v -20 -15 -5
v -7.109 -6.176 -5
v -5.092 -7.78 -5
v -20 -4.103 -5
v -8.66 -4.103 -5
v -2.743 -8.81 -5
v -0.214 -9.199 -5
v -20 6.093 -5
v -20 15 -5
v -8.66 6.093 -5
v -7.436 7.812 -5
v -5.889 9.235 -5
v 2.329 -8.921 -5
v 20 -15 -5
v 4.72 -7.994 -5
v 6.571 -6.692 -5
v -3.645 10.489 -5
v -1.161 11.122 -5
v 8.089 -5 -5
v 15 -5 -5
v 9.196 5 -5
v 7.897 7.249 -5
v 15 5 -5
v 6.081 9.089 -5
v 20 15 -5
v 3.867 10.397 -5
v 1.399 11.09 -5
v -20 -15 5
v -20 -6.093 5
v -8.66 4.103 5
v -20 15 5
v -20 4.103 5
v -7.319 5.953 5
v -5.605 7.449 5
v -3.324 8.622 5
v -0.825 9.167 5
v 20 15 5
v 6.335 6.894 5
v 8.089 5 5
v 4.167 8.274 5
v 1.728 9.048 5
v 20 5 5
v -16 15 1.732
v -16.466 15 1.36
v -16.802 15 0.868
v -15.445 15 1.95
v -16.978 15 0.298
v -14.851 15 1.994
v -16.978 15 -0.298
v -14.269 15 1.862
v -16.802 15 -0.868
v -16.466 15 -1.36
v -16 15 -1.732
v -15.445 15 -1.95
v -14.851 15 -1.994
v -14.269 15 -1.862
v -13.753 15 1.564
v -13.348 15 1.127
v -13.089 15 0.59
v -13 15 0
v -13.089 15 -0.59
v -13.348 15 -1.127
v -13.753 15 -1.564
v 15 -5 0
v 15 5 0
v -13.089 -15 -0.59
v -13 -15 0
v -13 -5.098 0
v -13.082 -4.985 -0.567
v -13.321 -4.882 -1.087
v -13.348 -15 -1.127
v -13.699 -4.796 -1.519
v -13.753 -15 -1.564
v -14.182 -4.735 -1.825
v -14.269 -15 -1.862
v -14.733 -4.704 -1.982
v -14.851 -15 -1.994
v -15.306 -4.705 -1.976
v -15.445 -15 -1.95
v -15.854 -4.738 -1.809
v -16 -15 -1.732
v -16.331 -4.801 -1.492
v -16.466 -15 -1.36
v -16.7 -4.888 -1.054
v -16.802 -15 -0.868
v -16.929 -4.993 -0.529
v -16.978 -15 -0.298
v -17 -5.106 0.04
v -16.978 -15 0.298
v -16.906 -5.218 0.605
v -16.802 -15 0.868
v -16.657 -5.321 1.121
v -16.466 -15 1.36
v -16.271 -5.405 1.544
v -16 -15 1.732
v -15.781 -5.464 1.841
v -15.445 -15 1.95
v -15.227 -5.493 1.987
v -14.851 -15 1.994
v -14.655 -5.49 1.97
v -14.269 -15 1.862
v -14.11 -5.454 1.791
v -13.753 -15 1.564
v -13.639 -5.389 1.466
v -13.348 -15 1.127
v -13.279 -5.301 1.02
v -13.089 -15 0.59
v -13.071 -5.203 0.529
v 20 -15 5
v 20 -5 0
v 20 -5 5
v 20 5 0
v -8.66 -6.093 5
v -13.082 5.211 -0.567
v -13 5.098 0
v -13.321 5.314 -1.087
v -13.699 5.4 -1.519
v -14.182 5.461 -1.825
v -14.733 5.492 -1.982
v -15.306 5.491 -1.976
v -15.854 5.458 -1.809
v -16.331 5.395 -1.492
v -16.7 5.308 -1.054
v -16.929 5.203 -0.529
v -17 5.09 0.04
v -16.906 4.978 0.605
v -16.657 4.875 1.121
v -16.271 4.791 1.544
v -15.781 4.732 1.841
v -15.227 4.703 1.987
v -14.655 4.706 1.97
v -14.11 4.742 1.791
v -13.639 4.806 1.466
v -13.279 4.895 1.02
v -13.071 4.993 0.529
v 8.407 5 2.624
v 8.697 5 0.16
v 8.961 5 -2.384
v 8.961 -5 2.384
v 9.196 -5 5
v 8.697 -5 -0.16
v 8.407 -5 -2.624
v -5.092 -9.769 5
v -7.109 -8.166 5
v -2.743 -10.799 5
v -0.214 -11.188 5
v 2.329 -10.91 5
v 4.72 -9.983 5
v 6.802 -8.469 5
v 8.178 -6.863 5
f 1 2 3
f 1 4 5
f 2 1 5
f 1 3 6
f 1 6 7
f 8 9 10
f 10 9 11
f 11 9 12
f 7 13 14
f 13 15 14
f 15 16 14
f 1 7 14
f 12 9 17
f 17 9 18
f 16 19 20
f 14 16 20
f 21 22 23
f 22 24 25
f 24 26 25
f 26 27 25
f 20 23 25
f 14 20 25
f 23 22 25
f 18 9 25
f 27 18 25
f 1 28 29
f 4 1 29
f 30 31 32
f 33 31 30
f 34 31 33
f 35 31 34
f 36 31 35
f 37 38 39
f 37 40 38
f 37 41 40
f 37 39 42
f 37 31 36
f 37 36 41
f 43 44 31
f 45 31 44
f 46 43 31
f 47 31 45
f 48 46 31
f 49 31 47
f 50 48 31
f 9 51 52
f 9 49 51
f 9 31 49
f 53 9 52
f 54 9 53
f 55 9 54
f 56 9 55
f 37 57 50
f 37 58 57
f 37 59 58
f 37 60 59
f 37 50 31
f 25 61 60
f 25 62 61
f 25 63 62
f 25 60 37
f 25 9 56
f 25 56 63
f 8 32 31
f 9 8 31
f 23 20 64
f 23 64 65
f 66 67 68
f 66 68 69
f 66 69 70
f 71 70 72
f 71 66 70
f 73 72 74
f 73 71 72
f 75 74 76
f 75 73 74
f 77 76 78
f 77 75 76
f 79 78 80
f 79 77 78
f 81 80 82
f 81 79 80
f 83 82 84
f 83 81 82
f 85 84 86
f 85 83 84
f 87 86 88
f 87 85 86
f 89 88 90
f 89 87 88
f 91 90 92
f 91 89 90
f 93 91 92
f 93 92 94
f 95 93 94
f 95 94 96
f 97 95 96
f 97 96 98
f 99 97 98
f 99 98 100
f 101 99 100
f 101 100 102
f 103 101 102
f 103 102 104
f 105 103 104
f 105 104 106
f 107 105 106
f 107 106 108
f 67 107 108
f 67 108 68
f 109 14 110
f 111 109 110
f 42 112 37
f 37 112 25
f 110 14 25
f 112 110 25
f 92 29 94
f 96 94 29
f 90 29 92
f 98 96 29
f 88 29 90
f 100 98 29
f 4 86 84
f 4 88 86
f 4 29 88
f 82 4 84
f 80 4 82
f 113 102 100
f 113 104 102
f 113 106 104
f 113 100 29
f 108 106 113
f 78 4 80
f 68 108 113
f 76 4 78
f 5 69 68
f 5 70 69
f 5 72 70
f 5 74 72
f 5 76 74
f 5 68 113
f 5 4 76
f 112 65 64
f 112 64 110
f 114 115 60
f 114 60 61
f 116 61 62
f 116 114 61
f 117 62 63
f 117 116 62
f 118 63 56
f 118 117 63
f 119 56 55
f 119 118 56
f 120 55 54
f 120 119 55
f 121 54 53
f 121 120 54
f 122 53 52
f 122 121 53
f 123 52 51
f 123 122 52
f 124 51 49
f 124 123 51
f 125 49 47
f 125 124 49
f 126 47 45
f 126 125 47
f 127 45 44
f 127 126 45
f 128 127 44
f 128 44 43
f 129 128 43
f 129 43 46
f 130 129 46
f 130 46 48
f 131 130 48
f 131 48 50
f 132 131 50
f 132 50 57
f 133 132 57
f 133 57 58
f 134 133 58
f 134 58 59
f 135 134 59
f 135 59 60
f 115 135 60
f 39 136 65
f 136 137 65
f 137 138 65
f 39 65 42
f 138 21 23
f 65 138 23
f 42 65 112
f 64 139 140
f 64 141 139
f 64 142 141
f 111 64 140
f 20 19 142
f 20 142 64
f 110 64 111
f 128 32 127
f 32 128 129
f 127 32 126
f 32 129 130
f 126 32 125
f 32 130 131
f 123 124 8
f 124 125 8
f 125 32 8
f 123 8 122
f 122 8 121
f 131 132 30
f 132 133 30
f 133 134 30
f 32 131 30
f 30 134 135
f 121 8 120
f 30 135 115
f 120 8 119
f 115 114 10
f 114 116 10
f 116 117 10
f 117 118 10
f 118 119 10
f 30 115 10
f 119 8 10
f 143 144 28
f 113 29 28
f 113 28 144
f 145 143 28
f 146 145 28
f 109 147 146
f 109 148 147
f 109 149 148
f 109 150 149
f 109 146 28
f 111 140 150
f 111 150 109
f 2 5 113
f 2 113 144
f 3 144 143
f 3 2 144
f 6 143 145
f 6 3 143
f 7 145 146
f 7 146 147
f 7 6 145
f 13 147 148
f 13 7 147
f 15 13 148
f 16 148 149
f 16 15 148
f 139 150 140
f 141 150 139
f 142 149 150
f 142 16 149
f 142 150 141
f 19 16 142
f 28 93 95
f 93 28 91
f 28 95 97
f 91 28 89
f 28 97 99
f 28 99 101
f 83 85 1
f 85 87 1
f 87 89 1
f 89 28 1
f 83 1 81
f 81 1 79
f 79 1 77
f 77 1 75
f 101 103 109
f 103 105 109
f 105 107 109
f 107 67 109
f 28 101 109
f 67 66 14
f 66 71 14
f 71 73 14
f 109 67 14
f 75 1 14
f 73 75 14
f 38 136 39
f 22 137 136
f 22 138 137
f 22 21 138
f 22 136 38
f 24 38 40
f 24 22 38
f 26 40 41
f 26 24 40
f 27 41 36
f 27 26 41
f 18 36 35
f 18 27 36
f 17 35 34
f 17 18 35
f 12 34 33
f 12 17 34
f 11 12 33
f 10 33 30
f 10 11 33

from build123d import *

# Parameters (mm, degrees)
BOX002_W               = 10
BOX002_H               = 10
BOX002_DEPTH           = 5
CYLINDER003_R          = 2
CYLINDER003_DEPTH      = 30
CYLINDER003_ROLL_ANGLE = -90
CYLINDER004_R          = 10
CYLINDER004_DEPTH      = 20
BOX003_W               = 15
BOX003_H               = 10
BOX003_DEPTH           = 20
FUSION001_ROLL_ANGLE   = 11.25
BOX001_W               = 10
BOX001_H               = 10
BOX001_DEPTH           = 10
BOX_W                  = 40
BOX_H                  = 30
BOX_DEPTH              = 10


with BuildPart() as cube002:
    # Box002 → Box002 (new body)
    with BuildSketch(Plane(origin=(10, -5, 0), x_dir=(1, 0, 0), z_dir=(0, 0, 1))):
        with Locations((5, 5)):
            Rectangle(BOX002_W, BOX002_H)
    extrude(amount=BOX002_DEPTH)


with BuildPart() as cylinder003:
    # Cylinder003 → Cylinder003 (new body)
    with BuildSketch(Plane.XY):
        Circle(CYLINDER003_R)
    extrude(amount=CYLINDER003_DEPTH)


with BuildPart() as cylinder003_1:
    # Cylinder003 roll: moved
    add(cylinder003.part.rotate(Axis((0, 0, 0), (1, 0, 0)), CYLINDER003_ROLL_ANGLE))


with BuildPart() as cylinder003_2:
    # Cylinder003 placement: moved
    add(cylinder003_1.part.moved(Location((-15, -15, 0))))


with BuildPart() as rail_cylinder:
    # Cylinder004 → Cylinder004 (new body)
    with BuildSketch(Plane.XY.offset(-10)):
        Circle(CYLINDER004_R)
    extrude(amount=CYLINDER004_DEPTH)


with BuildPart() as fusion001:
    # Box003 → Box003 (new body)
    with BuildSketch(Plane(origin=(-20, -5, -10), x_dir=(1, 0, 0), z_dir=(0, 0, 1))):
        with Locations((7.5, 5)):
            Rectangle(BOX003_W, BOX003_H)
    extrude(amount=BOX003_DEPTH)

    # Fusion001: union Rail Cylinder
    add(rail_cylinder.part)


with BuildPart() as fusion001_1:
    # Fusion001 roll: moved
    add(fusion001.part.rotate(Axis((0, 0, 0), (1, 0, 0)), FUSION001_ROLL_ANGLE))


with BuildPart() as fusion001_2:
    # Fusion001 placement: moved
    add(fusion001_1.part)


with BuildPart() as negative_fusion:
    # Box001 → Box001 (new body)
    with BuildSketch(Plane(origin=(5, -5, -5), x_dir=(1, 0, 0), z_dir=(0, 0, 1))):
        with Locations((5, 5)):
            Rectangle(BOX001_W, BOX001_H)
    extrude(amount=BOX001_DEPTH)

    # Fusion: union Cube002, Cylinder003, Fusion001
    add(cube002.part)
    add(cylinder003_2.part)
    add(fusion001_2.part)


with BuildPart() as cut:
    # Box → Box (new body)
    with BuildSketch(Plane(origin=(-20, -15, -5), x_dir=(1, 0, 0), z_dir=(0, 0, 1))):
        with Locations((20, 15)):
            Rectangle(BOX_W, BOX_H)
    extrude(amount=BOX_DEPTH)

    # Cut: cut Negative Fusion
    add(negative_fusion.part, mode=Mode.SUBTRACT)


solid = cut.part
